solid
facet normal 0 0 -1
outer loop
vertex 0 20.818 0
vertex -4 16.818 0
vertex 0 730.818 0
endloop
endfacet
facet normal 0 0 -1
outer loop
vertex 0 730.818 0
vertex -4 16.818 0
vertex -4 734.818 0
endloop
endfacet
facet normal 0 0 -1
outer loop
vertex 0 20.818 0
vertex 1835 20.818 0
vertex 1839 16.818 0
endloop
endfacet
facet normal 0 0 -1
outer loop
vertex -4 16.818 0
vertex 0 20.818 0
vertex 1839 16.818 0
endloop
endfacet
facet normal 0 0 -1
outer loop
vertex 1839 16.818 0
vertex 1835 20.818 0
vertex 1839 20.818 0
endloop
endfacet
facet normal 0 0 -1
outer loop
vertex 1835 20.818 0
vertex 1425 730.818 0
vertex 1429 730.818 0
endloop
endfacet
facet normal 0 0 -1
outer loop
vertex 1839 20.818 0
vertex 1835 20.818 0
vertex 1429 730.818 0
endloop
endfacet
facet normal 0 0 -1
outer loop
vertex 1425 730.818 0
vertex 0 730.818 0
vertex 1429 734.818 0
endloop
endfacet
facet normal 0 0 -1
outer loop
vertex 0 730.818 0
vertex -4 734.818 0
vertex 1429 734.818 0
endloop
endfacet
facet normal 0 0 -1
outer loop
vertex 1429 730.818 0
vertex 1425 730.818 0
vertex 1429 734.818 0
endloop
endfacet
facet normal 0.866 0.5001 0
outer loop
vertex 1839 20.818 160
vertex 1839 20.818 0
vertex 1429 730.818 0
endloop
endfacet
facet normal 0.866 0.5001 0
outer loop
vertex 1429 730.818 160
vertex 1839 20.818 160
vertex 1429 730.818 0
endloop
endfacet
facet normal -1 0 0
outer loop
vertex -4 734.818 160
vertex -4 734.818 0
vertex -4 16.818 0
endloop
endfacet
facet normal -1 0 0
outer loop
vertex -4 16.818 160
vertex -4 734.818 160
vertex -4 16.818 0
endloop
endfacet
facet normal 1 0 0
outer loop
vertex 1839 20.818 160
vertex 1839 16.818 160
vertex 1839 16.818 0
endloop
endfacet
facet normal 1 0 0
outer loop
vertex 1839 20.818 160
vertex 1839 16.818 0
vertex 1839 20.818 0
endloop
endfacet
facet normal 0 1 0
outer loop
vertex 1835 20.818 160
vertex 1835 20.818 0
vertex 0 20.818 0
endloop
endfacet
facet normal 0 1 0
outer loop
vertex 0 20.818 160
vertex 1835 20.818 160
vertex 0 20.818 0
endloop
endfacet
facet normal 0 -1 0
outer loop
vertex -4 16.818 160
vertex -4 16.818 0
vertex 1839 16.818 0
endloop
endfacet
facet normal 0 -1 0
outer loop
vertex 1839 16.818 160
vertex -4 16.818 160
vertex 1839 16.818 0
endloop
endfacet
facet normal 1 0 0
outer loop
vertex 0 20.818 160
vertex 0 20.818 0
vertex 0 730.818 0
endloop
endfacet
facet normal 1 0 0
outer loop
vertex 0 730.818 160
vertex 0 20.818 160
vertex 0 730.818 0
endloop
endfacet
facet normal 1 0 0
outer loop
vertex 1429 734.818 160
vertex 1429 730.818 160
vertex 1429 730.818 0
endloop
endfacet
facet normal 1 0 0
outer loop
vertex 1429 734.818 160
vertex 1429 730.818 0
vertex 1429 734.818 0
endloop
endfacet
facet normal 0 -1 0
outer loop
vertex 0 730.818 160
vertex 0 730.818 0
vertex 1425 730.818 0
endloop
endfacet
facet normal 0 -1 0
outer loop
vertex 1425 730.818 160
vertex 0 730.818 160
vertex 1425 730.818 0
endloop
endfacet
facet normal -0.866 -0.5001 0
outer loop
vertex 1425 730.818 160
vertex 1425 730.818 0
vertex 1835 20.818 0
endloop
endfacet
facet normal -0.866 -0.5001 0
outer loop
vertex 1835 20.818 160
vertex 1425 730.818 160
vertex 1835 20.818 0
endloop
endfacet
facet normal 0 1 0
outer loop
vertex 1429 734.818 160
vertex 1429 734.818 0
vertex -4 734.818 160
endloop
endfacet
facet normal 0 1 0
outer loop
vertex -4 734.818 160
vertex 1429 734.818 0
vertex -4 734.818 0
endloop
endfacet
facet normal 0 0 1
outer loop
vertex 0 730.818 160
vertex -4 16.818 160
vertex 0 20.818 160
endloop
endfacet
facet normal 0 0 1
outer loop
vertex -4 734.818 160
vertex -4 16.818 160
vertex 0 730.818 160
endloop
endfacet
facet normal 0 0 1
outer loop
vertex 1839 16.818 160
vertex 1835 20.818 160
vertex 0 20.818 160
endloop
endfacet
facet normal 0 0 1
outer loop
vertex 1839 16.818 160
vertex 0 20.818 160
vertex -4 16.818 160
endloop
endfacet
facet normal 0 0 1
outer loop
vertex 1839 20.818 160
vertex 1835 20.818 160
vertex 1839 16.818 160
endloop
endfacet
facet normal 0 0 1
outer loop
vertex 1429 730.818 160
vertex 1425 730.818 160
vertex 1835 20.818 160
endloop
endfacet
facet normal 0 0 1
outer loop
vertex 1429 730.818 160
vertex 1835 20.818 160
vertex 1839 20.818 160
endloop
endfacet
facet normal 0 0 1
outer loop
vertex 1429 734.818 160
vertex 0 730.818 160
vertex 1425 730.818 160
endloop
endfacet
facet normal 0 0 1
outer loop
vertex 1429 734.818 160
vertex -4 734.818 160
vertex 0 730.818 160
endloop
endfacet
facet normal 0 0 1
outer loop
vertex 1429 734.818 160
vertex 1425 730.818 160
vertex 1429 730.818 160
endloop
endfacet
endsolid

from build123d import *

# Parameters (mm, degrees)
F1_DEPTH = 160


with BuildPart() as f1:
    # F0 (on Top) → F1 (new body)
    with BuildSketch(Plane.XY):
        Polygon((-4, 16.818339), (0, 16.818339), (1835, 16.818339), (1839, 16.818339), (1839, 20.818339), (1429, 730.818339), (1429, 734.818339), (1426.690141, 734.818339), (1425, 734.818339), (0, 734.818339), (-4, 734.818339), (-4, 730.818339), (-4, 20.818339), align=None)
        Polygon((1835, 20.818339), (0, 20.818339), (0, 730.818339), (1425, 730.818339), align=None, mode=Mode.SUBTRACT)
    extrude(amount=F1_DEPTH)


solid = f1.part
